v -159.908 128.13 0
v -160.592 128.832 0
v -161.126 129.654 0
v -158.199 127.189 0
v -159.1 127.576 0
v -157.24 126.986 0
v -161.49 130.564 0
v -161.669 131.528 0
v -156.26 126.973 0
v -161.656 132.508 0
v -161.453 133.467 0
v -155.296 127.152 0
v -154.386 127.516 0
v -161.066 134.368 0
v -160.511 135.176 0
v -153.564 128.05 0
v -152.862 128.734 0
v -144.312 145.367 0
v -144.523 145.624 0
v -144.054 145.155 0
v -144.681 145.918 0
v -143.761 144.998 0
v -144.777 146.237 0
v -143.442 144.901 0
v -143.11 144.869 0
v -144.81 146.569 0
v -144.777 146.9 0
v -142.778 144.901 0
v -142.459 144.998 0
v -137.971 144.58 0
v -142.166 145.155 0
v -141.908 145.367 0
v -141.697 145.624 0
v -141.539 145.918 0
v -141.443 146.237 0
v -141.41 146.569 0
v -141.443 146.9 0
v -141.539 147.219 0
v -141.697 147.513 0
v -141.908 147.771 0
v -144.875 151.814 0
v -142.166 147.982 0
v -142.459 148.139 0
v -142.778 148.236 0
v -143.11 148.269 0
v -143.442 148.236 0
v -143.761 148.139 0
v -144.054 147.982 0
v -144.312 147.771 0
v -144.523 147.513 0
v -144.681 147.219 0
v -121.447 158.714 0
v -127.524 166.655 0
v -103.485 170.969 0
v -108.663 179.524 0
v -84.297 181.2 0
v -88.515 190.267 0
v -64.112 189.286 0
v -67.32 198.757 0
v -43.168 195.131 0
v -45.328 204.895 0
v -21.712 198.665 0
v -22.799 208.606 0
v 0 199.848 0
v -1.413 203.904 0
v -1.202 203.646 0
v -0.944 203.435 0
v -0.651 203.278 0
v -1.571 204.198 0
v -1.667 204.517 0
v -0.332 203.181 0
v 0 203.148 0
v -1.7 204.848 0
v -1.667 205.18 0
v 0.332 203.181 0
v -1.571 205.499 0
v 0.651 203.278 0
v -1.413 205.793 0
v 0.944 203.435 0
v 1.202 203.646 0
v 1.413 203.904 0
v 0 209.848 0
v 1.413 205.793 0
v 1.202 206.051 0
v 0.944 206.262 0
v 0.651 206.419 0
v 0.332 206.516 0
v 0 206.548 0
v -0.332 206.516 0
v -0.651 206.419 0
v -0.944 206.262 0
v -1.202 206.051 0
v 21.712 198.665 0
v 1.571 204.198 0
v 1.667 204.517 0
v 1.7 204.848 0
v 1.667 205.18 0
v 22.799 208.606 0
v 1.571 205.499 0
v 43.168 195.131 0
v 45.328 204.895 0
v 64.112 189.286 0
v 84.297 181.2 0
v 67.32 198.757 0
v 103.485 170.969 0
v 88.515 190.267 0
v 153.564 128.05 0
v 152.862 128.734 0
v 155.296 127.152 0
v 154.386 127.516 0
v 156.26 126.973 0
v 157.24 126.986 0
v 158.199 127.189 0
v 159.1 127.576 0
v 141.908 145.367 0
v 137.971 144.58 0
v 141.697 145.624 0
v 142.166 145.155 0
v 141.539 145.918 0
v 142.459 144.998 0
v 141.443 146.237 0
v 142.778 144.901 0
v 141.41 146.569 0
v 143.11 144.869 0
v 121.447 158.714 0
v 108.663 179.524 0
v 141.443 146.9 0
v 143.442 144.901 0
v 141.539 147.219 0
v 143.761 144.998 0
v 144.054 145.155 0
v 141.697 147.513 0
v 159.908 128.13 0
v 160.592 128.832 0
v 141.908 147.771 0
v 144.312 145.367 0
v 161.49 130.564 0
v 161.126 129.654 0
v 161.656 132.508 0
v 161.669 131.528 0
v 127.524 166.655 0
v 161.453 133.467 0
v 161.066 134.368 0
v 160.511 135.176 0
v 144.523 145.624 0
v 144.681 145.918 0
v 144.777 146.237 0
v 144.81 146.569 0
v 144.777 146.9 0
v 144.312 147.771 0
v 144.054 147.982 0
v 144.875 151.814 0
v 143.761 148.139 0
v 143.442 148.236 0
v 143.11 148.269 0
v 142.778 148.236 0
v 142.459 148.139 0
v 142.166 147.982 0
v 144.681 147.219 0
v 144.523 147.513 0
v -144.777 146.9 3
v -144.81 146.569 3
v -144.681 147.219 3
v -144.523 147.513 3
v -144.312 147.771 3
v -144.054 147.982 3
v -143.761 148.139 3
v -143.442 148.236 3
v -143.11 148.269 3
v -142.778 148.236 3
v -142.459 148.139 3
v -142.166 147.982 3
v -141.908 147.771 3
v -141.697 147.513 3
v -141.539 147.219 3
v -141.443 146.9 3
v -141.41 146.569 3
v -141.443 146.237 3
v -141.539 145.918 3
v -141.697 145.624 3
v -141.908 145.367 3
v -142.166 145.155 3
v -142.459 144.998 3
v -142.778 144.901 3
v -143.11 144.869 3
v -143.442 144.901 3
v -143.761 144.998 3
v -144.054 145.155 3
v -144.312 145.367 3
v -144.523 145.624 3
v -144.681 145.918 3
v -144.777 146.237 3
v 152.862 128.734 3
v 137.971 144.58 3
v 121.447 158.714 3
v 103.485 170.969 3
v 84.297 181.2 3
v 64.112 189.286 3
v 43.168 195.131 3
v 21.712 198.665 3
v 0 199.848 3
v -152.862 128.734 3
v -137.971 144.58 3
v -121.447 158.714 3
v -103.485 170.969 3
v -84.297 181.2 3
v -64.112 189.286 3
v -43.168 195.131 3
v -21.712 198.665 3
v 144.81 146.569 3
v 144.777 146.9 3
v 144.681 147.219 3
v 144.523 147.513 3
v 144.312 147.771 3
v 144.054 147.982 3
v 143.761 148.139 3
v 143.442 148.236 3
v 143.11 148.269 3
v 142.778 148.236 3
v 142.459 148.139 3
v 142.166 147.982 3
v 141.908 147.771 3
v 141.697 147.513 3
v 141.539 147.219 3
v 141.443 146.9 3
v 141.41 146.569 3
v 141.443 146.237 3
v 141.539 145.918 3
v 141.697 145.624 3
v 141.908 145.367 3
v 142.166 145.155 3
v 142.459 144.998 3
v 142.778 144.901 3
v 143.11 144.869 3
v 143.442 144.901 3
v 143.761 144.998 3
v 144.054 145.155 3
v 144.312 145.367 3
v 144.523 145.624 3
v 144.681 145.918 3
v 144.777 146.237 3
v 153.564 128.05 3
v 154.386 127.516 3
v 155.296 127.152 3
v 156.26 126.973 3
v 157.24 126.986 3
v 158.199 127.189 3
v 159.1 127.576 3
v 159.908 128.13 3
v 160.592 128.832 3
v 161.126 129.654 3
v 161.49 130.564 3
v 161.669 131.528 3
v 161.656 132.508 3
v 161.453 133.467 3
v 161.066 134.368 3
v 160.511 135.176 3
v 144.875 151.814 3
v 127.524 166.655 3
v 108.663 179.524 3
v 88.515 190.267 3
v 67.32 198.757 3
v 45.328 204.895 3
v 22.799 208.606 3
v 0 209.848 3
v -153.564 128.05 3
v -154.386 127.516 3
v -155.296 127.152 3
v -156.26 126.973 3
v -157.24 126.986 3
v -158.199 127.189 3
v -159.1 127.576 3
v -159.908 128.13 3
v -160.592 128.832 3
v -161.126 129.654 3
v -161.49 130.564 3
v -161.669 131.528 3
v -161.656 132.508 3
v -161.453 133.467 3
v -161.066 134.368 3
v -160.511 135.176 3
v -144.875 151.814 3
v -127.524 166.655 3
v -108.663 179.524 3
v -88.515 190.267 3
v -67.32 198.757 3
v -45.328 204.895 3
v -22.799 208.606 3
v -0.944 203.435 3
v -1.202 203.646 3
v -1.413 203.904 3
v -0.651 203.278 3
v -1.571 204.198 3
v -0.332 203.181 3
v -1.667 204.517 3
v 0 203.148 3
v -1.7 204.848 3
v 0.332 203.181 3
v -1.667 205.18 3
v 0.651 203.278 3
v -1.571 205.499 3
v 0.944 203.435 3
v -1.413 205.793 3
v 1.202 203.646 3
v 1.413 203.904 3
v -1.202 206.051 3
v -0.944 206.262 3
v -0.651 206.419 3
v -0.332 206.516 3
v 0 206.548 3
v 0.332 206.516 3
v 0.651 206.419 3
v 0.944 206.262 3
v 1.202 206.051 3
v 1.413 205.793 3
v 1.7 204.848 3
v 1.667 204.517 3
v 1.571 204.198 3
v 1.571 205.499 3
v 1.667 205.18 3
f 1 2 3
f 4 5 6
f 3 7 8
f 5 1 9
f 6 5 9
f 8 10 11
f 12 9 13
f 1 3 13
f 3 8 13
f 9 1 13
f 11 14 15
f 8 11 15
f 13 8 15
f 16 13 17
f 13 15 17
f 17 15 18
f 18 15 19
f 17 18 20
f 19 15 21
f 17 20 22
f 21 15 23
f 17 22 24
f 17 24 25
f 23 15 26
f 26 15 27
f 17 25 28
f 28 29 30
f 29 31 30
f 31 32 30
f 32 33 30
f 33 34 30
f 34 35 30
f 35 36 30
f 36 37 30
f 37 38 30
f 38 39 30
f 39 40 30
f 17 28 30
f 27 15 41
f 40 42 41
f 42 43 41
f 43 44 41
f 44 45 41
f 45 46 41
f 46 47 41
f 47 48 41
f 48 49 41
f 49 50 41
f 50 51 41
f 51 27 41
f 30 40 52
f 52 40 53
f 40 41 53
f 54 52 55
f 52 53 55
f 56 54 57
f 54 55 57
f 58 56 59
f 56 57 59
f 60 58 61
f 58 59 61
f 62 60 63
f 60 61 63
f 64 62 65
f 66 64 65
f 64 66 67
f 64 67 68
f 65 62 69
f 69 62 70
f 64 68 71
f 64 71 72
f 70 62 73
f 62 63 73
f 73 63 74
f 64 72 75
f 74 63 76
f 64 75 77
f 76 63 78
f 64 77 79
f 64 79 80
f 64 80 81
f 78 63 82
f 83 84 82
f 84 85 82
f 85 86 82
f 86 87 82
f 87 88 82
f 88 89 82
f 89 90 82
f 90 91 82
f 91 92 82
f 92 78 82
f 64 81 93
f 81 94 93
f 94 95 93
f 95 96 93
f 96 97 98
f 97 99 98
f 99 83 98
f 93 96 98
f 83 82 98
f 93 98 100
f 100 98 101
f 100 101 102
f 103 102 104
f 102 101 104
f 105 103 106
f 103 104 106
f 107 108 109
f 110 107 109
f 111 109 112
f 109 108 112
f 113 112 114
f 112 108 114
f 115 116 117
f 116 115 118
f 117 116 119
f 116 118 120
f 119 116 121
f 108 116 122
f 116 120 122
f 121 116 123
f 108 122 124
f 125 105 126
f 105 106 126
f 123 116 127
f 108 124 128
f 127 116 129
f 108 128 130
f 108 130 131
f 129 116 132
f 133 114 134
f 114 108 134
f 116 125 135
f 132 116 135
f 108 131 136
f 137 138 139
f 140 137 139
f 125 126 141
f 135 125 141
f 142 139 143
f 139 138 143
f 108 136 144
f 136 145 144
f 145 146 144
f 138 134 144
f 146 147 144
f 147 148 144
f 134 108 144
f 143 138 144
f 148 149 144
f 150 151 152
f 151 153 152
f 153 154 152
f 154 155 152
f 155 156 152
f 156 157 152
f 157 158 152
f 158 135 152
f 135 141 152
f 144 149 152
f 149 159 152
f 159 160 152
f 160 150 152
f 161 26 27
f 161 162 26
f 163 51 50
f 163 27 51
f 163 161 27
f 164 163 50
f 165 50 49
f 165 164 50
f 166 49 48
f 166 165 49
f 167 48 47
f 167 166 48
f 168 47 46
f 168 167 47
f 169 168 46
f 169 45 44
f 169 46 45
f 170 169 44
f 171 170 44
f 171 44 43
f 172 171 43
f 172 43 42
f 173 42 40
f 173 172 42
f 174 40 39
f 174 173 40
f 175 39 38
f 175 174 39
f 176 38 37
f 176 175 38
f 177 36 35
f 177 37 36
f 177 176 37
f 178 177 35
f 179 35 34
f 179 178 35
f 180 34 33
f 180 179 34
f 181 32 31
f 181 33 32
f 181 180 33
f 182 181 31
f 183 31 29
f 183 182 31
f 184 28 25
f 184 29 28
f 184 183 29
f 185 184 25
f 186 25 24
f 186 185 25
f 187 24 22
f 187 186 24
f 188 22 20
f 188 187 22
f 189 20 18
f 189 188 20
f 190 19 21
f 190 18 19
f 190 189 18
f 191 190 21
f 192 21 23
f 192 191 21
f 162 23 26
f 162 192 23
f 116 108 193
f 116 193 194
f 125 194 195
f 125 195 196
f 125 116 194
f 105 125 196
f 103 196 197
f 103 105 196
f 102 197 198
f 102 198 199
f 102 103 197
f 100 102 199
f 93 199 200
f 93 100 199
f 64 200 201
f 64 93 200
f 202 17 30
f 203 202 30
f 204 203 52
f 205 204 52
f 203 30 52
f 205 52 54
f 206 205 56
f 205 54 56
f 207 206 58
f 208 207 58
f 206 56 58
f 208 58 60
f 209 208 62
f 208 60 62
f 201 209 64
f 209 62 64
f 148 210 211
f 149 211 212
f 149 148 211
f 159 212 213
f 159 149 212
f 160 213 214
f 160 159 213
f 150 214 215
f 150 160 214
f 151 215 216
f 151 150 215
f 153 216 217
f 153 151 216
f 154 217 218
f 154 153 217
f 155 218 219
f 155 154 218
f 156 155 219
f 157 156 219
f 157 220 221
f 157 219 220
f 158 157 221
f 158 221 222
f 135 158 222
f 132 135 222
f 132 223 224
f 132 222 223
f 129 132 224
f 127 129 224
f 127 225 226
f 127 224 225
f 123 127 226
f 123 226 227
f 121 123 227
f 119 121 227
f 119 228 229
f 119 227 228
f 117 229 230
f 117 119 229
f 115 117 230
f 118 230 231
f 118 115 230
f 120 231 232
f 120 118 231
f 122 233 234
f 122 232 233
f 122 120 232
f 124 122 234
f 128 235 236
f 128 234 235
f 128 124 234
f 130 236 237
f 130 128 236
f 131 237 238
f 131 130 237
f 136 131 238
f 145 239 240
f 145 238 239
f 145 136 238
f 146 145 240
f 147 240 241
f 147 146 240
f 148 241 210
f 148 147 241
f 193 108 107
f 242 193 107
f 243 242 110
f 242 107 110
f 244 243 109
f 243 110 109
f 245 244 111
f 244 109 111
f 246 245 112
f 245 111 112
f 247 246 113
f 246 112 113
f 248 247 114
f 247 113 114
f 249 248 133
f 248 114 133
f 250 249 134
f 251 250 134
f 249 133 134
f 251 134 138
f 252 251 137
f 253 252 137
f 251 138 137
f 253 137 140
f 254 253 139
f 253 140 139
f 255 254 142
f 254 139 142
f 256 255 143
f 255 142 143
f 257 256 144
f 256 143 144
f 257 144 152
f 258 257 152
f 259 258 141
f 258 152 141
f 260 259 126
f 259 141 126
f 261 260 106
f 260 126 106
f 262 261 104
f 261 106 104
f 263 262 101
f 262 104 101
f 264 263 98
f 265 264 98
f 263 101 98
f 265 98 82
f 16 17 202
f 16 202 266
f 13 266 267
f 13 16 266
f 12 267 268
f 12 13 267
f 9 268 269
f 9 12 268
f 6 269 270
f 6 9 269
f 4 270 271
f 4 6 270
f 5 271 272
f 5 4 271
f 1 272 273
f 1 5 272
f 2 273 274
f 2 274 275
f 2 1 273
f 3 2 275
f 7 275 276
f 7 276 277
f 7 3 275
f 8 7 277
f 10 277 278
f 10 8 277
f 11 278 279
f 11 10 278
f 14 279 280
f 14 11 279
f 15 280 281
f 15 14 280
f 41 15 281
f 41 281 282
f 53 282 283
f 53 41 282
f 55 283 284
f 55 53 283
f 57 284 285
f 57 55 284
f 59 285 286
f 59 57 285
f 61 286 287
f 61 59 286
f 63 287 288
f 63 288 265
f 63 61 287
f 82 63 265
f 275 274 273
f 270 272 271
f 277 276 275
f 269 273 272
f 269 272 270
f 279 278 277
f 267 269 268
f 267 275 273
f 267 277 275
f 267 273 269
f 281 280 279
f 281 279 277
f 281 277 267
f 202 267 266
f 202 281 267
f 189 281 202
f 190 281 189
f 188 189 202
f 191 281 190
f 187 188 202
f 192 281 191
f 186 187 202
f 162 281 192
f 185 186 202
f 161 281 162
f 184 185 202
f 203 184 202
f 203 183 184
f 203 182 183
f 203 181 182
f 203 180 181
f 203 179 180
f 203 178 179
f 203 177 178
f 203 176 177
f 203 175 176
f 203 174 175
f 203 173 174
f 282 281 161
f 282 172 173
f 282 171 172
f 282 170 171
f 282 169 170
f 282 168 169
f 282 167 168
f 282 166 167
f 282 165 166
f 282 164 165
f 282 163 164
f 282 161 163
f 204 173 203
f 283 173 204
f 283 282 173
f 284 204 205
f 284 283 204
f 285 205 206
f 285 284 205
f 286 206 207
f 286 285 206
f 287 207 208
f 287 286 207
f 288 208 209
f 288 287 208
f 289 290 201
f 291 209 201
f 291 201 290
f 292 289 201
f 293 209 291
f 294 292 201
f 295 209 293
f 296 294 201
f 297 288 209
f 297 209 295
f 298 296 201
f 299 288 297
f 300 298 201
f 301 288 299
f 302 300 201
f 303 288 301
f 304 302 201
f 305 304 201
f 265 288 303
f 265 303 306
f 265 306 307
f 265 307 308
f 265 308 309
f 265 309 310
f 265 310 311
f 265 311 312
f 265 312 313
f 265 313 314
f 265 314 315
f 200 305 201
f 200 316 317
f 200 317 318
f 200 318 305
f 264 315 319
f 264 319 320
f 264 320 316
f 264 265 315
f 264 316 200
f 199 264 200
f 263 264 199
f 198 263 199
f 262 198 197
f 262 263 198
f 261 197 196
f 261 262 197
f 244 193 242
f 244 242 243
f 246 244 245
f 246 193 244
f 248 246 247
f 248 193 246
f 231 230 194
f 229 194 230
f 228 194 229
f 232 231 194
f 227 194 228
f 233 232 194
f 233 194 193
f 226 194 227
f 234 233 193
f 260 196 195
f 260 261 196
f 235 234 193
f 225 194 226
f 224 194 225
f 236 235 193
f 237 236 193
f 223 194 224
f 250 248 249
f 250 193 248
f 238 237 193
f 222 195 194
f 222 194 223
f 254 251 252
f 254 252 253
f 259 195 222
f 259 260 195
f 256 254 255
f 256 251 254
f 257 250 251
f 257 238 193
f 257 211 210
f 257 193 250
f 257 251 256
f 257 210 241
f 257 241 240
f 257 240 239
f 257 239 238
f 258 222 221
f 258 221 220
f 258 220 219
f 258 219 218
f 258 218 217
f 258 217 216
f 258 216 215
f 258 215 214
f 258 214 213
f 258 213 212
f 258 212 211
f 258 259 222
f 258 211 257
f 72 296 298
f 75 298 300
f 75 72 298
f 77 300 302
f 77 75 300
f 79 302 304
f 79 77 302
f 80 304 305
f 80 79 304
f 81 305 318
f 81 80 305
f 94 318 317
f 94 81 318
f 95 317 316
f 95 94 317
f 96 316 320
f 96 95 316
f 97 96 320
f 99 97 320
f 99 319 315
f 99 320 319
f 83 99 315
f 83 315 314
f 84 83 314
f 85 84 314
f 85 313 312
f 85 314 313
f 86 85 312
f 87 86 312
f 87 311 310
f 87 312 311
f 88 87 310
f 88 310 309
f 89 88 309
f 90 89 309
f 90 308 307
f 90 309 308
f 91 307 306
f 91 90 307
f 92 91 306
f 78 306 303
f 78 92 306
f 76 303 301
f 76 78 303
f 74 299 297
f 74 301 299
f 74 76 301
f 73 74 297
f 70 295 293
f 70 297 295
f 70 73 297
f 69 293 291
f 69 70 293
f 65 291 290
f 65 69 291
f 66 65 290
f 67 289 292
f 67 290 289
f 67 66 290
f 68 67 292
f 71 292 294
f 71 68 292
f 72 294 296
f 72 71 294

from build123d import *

# Parameters (mm, degrees)
PAD014_DEPTH         = 3
SKETCH055_R          = 1.7
POCKET019_DEPTH      = 363.445695
POCKET019_DEPTH_BACK = 366.445695


with BuildPart() as part:
    # Sketch052 → Pad014 (new body)
    with BuildSketch(Plane.XY):
        with BuildLine():
            ThreePointArc((152.862483, 128.734095), (84.297377, 181.199774), (0, 199.848457))
            Line((0, 199.848457), (0, 209.848457))
            ThreePointArc((160.511403, 135.17568), (88.515442, 190.266633), (0, 209.848457))
            ThreePointArc((152.862483, 128.734095), (159.907736, 128.130427), (160.511403, 135.17568))
        make_face()
    pad014 = extrude(amount=PAD014_DEPTH)

    # Sketch055 → Pocket019 (cut, two sides)
    with BuildSketch(Plane.XY) as pocket019_sk:
        with Locations((143.11, 146.568818)):
            Circle(SKETCH055_R)
        with BuildLine():
            Line((0, 203.148457), (0, 206.548457))
            ThreePointArc((0, 203.148457), (1.7, 204.848457), (0, 206.548457))
        make_face()
    pocket019 = extrude(amount=-POCKET019_DEPTH, mode=Mode.SUBTRACT) + extrude(pocket019_sk.sketch, amount=POCKET019_DEPTH_BACK, mode=Mode.SUBTRACT)

    # Mirrored019: Pad014, Pocket019 across Sketch052 V_Axis
    add(pad014.mirror(Plane(origin=(0, 0, 0), x_dir=(0, 0, 1), z_dir=(1, 0, 0))))
    add(pocket019.mirror(Plane(origin=(0, 0, 0), x_dir=(0, 0, 1), z_dir=(1, 0, 0))), mode=Mode.SUBTRACT)


solid = part.part
